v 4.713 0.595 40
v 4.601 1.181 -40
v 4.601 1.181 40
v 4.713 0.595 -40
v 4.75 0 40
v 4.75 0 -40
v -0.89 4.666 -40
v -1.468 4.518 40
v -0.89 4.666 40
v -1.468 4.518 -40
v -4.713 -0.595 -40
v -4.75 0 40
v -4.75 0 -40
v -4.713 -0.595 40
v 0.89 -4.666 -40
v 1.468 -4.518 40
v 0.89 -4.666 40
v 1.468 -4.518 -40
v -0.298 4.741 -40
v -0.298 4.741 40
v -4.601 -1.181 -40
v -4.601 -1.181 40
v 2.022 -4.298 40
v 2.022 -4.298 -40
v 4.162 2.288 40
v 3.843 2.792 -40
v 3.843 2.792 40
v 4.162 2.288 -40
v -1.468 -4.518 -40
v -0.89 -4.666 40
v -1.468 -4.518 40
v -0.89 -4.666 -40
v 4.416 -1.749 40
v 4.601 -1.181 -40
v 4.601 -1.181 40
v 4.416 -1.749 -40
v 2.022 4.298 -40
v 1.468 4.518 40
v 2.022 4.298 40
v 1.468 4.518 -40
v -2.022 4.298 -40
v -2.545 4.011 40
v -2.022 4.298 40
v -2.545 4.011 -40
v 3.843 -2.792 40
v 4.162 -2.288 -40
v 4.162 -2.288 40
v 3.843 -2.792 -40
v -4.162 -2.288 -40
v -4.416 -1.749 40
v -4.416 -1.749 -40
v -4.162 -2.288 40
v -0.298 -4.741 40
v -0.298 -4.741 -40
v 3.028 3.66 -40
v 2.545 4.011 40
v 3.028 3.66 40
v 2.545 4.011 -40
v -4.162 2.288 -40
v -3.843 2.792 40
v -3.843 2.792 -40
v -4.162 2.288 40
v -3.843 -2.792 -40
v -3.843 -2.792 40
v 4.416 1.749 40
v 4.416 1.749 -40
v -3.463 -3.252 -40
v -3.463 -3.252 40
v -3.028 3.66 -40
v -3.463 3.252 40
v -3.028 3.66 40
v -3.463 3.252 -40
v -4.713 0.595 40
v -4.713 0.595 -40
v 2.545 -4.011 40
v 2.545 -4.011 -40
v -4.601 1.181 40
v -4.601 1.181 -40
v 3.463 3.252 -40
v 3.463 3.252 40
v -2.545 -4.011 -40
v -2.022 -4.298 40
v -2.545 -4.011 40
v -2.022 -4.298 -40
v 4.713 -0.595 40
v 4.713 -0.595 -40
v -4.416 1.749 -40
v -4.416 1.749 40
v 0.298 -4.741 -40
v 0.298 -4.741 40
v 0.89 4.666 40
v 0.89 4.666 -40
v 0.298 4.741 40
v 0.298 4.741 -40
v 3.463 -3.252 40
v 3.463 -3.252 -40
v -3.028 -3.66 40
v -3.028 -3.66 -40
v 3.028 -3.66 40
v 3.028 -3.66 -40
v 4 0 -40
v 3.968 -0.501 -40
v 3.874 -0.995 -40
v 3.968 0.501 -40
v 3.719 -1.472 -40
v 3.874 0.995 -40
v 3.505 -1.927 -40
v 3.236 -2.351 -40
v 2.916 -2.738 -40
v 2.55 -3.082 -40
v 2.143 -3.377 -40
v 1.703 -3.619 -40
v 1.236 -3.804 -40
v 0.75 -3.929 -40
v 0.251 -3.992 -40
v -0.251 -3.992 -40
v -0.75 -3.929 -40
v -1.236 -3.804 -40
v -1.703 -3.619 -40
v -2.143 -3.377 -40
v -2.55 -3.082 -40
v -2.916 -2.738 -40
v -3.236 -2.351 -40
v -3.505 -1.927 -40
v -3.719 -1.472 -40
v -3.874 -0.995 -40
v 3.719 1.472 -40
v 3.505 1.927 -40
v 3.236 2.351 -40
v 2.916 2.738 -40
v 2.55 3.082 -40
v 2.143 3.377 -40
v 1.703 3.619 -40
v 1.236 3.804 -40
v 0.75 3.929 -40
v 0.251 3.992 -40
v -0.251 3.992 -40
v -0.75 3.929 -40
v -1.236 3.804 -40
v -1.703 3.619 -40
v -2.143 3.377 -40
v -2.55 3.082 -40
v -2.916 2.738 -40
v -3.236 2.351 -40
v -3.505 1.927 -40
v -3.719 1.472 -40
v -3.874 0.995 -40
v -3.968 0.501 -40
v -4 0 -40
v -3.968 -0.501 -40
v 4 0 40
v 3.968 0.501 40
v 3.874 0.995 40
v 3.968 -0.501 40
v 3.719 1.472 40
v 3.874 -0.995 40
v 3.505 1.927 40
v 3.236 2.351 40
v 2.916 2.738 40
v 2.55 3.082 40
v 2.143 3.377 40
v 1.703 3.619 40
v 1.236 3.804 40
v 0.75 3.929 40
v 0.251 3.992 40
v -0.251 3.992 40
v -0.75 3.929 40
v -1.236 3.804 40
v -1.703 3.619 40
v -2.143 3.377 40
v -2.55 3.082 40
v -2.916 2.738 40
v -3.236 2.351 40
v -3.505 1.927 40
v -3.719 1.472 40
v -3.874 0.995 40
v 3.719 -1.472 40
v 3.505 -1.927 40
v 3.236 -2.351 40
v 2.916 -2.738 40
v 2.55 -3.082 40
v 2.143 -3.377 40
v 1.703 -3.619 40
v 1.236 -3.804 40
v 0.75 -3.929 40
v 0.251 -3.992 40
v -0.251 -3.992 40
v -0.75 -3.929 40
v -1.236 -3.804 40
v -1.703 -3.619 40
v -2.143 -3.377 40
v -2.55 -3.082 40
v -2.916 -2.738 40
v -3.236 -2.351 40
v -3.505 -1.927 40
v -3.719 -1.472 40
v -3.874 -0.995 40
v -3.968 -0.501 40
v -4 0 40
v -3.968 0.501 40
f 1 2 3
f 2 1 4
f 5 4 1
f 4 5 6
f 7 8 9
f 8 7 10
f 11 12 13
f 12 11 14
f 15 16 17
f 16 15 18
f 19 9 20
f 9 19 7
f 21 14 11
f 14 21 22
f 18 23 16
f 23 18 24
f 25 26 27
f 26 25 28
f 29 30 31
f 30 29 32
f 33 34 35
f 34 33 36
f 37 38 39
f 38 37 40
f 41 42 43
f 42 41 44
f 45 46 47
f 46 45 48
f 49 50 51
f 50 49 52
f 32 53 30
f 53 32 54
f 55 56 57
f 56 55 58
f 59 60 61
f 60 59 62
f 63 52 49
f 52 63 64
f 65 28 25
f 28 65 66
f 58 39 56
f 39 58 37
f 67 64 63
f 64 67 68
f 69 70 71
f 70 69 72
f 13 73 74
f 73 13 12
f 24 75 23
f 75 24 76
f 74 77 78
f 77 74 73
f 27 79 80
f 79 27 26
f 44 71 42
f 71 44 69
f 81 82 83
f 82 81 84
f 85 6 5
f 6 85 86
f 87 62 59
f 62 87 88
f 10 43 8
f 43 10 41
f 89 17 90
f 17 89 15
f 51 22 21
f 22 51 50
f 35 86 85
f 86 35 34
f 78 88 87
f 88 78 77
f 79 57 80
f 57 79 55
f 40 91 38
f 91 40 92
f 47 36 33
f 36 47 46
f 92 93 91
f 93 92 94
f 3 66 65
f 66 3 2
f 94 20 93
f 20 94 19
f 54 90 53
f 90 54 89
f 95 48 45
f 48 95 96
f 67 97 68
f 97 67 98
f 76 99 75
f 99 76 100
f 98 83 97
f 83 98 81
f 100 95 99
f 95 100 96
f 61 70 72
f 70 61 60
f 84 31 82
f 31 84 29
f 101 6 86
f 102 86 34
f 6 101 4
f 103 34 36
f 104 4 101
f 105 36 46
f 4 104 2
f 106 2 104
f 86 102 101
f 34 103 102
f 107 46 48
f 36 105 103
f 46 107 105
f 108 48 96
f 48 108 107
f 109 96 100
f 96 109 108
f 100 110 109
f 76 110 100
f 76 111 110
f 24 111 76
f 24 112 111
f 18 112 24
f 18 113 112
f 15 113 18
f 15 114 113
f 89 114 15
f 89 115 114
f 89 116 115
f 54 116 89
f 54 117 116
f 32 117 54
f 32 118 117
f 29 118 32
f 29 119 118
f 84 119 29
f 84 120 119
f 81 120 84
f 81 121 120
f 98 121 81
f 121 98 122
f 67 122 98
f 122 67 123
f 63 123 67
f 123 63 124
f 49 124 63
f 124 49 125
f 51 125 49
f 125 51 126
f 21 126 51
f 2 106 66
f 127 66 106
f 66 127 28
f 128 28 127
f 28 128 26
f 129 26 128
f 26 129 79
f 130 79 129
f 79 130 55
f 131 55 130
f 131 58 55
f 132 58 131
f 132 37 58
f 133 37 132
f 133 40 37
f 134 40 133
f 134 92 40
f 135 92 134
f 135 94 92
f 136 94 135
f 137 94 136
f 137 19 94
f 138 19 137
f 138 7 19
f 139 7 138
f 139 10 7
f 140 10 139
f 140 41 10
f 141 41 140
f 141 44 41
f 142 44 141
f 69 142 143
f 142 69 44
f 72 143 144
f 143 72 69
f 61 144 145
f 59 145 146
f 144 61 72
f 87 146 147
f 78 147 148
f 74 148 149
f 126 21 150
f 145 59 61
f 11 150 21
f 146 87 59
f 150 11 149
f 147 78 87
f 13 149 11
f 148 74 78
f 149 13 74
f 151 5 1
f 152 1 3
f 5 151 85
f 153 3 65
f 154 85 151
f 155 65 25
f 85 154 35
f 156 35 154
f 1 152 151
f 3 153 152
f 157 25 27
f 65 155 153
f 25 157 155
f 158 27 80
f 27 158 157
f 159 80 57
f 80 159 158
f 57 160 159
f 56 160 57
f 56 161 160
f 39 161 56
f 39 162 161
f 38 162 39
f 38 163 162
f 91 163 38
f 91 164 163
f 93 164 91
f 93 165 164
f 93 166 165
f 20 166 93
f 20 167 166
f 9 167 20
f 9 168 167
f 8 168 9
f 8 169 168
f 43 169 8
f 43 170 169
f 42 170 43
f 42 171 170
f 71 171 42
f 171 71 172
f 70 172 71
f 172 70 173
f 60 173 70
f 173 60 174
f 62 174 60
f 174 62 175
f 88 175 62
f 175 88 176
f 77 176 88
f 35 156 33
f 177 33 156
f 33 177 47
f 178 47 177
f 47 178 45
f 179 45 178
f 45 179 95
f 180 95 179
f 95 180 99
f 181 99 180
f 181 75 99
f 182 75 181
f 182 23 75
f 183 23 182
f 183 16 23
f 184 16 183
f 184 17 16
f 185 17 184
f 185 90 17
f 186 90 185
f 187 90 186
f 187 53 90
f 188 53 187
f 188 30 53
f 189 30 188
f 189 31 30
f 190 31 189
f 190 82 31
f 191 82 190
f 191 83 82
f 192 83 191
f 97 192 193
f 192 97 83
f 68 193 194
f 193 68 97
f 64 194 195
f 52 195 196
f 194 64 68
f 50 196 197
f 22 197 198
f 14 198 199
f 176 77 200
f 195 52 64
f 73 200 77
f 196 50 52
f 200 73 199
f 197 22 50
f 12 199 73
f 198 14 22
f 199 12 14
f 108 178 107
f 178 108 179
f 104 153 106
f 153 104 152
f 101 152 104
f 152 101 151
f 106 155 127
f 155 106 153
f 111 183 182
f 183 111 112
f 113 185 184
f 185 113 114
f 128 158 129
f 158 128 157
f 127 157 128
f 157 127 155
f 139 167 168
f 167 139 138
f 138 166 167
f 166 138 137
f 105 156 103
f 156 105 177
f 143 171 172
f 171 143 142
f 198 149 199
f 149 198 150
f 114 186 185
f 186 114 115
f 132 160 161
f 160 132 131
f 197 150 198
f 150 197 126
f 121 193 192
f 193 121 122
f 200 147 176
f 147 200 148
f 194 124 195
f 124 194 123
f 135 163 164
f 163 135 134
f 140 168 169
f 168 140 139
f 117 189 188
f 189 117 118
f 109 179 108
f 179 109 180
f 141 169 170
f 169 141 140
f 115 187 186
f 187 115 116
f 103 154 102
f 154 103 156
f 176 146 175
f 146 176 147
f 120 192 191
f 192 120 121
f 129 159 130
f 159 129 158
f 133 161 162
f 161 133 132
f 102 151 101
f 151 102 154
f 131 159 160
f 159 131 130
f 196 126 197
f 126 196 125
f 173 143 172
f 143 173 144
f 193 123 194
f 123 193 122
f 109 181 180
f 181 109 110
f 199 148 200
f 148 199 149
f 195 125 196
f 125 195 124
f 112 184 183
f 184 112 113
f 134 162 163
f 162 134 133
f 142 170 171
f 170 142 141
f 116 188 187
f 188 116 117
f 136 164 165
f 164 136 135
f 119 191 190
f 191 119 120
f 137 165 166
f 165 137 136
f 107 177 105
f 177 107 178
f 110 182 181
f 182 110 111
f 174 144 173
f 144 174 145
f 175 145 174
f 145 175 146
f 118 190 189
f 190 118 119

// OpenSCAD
$fn = 50;


difference() {
	union() {
		translate(v = [0, 0, -40.0000000000]) {
			cylinder(h = 80, r = 4.7500000000);
		}
	}
	union() {
		translate(v = [0, 0, -100.0000000000]) {
			cylinder(h = 200, r = 4.0000000000);
		}
	}
}
